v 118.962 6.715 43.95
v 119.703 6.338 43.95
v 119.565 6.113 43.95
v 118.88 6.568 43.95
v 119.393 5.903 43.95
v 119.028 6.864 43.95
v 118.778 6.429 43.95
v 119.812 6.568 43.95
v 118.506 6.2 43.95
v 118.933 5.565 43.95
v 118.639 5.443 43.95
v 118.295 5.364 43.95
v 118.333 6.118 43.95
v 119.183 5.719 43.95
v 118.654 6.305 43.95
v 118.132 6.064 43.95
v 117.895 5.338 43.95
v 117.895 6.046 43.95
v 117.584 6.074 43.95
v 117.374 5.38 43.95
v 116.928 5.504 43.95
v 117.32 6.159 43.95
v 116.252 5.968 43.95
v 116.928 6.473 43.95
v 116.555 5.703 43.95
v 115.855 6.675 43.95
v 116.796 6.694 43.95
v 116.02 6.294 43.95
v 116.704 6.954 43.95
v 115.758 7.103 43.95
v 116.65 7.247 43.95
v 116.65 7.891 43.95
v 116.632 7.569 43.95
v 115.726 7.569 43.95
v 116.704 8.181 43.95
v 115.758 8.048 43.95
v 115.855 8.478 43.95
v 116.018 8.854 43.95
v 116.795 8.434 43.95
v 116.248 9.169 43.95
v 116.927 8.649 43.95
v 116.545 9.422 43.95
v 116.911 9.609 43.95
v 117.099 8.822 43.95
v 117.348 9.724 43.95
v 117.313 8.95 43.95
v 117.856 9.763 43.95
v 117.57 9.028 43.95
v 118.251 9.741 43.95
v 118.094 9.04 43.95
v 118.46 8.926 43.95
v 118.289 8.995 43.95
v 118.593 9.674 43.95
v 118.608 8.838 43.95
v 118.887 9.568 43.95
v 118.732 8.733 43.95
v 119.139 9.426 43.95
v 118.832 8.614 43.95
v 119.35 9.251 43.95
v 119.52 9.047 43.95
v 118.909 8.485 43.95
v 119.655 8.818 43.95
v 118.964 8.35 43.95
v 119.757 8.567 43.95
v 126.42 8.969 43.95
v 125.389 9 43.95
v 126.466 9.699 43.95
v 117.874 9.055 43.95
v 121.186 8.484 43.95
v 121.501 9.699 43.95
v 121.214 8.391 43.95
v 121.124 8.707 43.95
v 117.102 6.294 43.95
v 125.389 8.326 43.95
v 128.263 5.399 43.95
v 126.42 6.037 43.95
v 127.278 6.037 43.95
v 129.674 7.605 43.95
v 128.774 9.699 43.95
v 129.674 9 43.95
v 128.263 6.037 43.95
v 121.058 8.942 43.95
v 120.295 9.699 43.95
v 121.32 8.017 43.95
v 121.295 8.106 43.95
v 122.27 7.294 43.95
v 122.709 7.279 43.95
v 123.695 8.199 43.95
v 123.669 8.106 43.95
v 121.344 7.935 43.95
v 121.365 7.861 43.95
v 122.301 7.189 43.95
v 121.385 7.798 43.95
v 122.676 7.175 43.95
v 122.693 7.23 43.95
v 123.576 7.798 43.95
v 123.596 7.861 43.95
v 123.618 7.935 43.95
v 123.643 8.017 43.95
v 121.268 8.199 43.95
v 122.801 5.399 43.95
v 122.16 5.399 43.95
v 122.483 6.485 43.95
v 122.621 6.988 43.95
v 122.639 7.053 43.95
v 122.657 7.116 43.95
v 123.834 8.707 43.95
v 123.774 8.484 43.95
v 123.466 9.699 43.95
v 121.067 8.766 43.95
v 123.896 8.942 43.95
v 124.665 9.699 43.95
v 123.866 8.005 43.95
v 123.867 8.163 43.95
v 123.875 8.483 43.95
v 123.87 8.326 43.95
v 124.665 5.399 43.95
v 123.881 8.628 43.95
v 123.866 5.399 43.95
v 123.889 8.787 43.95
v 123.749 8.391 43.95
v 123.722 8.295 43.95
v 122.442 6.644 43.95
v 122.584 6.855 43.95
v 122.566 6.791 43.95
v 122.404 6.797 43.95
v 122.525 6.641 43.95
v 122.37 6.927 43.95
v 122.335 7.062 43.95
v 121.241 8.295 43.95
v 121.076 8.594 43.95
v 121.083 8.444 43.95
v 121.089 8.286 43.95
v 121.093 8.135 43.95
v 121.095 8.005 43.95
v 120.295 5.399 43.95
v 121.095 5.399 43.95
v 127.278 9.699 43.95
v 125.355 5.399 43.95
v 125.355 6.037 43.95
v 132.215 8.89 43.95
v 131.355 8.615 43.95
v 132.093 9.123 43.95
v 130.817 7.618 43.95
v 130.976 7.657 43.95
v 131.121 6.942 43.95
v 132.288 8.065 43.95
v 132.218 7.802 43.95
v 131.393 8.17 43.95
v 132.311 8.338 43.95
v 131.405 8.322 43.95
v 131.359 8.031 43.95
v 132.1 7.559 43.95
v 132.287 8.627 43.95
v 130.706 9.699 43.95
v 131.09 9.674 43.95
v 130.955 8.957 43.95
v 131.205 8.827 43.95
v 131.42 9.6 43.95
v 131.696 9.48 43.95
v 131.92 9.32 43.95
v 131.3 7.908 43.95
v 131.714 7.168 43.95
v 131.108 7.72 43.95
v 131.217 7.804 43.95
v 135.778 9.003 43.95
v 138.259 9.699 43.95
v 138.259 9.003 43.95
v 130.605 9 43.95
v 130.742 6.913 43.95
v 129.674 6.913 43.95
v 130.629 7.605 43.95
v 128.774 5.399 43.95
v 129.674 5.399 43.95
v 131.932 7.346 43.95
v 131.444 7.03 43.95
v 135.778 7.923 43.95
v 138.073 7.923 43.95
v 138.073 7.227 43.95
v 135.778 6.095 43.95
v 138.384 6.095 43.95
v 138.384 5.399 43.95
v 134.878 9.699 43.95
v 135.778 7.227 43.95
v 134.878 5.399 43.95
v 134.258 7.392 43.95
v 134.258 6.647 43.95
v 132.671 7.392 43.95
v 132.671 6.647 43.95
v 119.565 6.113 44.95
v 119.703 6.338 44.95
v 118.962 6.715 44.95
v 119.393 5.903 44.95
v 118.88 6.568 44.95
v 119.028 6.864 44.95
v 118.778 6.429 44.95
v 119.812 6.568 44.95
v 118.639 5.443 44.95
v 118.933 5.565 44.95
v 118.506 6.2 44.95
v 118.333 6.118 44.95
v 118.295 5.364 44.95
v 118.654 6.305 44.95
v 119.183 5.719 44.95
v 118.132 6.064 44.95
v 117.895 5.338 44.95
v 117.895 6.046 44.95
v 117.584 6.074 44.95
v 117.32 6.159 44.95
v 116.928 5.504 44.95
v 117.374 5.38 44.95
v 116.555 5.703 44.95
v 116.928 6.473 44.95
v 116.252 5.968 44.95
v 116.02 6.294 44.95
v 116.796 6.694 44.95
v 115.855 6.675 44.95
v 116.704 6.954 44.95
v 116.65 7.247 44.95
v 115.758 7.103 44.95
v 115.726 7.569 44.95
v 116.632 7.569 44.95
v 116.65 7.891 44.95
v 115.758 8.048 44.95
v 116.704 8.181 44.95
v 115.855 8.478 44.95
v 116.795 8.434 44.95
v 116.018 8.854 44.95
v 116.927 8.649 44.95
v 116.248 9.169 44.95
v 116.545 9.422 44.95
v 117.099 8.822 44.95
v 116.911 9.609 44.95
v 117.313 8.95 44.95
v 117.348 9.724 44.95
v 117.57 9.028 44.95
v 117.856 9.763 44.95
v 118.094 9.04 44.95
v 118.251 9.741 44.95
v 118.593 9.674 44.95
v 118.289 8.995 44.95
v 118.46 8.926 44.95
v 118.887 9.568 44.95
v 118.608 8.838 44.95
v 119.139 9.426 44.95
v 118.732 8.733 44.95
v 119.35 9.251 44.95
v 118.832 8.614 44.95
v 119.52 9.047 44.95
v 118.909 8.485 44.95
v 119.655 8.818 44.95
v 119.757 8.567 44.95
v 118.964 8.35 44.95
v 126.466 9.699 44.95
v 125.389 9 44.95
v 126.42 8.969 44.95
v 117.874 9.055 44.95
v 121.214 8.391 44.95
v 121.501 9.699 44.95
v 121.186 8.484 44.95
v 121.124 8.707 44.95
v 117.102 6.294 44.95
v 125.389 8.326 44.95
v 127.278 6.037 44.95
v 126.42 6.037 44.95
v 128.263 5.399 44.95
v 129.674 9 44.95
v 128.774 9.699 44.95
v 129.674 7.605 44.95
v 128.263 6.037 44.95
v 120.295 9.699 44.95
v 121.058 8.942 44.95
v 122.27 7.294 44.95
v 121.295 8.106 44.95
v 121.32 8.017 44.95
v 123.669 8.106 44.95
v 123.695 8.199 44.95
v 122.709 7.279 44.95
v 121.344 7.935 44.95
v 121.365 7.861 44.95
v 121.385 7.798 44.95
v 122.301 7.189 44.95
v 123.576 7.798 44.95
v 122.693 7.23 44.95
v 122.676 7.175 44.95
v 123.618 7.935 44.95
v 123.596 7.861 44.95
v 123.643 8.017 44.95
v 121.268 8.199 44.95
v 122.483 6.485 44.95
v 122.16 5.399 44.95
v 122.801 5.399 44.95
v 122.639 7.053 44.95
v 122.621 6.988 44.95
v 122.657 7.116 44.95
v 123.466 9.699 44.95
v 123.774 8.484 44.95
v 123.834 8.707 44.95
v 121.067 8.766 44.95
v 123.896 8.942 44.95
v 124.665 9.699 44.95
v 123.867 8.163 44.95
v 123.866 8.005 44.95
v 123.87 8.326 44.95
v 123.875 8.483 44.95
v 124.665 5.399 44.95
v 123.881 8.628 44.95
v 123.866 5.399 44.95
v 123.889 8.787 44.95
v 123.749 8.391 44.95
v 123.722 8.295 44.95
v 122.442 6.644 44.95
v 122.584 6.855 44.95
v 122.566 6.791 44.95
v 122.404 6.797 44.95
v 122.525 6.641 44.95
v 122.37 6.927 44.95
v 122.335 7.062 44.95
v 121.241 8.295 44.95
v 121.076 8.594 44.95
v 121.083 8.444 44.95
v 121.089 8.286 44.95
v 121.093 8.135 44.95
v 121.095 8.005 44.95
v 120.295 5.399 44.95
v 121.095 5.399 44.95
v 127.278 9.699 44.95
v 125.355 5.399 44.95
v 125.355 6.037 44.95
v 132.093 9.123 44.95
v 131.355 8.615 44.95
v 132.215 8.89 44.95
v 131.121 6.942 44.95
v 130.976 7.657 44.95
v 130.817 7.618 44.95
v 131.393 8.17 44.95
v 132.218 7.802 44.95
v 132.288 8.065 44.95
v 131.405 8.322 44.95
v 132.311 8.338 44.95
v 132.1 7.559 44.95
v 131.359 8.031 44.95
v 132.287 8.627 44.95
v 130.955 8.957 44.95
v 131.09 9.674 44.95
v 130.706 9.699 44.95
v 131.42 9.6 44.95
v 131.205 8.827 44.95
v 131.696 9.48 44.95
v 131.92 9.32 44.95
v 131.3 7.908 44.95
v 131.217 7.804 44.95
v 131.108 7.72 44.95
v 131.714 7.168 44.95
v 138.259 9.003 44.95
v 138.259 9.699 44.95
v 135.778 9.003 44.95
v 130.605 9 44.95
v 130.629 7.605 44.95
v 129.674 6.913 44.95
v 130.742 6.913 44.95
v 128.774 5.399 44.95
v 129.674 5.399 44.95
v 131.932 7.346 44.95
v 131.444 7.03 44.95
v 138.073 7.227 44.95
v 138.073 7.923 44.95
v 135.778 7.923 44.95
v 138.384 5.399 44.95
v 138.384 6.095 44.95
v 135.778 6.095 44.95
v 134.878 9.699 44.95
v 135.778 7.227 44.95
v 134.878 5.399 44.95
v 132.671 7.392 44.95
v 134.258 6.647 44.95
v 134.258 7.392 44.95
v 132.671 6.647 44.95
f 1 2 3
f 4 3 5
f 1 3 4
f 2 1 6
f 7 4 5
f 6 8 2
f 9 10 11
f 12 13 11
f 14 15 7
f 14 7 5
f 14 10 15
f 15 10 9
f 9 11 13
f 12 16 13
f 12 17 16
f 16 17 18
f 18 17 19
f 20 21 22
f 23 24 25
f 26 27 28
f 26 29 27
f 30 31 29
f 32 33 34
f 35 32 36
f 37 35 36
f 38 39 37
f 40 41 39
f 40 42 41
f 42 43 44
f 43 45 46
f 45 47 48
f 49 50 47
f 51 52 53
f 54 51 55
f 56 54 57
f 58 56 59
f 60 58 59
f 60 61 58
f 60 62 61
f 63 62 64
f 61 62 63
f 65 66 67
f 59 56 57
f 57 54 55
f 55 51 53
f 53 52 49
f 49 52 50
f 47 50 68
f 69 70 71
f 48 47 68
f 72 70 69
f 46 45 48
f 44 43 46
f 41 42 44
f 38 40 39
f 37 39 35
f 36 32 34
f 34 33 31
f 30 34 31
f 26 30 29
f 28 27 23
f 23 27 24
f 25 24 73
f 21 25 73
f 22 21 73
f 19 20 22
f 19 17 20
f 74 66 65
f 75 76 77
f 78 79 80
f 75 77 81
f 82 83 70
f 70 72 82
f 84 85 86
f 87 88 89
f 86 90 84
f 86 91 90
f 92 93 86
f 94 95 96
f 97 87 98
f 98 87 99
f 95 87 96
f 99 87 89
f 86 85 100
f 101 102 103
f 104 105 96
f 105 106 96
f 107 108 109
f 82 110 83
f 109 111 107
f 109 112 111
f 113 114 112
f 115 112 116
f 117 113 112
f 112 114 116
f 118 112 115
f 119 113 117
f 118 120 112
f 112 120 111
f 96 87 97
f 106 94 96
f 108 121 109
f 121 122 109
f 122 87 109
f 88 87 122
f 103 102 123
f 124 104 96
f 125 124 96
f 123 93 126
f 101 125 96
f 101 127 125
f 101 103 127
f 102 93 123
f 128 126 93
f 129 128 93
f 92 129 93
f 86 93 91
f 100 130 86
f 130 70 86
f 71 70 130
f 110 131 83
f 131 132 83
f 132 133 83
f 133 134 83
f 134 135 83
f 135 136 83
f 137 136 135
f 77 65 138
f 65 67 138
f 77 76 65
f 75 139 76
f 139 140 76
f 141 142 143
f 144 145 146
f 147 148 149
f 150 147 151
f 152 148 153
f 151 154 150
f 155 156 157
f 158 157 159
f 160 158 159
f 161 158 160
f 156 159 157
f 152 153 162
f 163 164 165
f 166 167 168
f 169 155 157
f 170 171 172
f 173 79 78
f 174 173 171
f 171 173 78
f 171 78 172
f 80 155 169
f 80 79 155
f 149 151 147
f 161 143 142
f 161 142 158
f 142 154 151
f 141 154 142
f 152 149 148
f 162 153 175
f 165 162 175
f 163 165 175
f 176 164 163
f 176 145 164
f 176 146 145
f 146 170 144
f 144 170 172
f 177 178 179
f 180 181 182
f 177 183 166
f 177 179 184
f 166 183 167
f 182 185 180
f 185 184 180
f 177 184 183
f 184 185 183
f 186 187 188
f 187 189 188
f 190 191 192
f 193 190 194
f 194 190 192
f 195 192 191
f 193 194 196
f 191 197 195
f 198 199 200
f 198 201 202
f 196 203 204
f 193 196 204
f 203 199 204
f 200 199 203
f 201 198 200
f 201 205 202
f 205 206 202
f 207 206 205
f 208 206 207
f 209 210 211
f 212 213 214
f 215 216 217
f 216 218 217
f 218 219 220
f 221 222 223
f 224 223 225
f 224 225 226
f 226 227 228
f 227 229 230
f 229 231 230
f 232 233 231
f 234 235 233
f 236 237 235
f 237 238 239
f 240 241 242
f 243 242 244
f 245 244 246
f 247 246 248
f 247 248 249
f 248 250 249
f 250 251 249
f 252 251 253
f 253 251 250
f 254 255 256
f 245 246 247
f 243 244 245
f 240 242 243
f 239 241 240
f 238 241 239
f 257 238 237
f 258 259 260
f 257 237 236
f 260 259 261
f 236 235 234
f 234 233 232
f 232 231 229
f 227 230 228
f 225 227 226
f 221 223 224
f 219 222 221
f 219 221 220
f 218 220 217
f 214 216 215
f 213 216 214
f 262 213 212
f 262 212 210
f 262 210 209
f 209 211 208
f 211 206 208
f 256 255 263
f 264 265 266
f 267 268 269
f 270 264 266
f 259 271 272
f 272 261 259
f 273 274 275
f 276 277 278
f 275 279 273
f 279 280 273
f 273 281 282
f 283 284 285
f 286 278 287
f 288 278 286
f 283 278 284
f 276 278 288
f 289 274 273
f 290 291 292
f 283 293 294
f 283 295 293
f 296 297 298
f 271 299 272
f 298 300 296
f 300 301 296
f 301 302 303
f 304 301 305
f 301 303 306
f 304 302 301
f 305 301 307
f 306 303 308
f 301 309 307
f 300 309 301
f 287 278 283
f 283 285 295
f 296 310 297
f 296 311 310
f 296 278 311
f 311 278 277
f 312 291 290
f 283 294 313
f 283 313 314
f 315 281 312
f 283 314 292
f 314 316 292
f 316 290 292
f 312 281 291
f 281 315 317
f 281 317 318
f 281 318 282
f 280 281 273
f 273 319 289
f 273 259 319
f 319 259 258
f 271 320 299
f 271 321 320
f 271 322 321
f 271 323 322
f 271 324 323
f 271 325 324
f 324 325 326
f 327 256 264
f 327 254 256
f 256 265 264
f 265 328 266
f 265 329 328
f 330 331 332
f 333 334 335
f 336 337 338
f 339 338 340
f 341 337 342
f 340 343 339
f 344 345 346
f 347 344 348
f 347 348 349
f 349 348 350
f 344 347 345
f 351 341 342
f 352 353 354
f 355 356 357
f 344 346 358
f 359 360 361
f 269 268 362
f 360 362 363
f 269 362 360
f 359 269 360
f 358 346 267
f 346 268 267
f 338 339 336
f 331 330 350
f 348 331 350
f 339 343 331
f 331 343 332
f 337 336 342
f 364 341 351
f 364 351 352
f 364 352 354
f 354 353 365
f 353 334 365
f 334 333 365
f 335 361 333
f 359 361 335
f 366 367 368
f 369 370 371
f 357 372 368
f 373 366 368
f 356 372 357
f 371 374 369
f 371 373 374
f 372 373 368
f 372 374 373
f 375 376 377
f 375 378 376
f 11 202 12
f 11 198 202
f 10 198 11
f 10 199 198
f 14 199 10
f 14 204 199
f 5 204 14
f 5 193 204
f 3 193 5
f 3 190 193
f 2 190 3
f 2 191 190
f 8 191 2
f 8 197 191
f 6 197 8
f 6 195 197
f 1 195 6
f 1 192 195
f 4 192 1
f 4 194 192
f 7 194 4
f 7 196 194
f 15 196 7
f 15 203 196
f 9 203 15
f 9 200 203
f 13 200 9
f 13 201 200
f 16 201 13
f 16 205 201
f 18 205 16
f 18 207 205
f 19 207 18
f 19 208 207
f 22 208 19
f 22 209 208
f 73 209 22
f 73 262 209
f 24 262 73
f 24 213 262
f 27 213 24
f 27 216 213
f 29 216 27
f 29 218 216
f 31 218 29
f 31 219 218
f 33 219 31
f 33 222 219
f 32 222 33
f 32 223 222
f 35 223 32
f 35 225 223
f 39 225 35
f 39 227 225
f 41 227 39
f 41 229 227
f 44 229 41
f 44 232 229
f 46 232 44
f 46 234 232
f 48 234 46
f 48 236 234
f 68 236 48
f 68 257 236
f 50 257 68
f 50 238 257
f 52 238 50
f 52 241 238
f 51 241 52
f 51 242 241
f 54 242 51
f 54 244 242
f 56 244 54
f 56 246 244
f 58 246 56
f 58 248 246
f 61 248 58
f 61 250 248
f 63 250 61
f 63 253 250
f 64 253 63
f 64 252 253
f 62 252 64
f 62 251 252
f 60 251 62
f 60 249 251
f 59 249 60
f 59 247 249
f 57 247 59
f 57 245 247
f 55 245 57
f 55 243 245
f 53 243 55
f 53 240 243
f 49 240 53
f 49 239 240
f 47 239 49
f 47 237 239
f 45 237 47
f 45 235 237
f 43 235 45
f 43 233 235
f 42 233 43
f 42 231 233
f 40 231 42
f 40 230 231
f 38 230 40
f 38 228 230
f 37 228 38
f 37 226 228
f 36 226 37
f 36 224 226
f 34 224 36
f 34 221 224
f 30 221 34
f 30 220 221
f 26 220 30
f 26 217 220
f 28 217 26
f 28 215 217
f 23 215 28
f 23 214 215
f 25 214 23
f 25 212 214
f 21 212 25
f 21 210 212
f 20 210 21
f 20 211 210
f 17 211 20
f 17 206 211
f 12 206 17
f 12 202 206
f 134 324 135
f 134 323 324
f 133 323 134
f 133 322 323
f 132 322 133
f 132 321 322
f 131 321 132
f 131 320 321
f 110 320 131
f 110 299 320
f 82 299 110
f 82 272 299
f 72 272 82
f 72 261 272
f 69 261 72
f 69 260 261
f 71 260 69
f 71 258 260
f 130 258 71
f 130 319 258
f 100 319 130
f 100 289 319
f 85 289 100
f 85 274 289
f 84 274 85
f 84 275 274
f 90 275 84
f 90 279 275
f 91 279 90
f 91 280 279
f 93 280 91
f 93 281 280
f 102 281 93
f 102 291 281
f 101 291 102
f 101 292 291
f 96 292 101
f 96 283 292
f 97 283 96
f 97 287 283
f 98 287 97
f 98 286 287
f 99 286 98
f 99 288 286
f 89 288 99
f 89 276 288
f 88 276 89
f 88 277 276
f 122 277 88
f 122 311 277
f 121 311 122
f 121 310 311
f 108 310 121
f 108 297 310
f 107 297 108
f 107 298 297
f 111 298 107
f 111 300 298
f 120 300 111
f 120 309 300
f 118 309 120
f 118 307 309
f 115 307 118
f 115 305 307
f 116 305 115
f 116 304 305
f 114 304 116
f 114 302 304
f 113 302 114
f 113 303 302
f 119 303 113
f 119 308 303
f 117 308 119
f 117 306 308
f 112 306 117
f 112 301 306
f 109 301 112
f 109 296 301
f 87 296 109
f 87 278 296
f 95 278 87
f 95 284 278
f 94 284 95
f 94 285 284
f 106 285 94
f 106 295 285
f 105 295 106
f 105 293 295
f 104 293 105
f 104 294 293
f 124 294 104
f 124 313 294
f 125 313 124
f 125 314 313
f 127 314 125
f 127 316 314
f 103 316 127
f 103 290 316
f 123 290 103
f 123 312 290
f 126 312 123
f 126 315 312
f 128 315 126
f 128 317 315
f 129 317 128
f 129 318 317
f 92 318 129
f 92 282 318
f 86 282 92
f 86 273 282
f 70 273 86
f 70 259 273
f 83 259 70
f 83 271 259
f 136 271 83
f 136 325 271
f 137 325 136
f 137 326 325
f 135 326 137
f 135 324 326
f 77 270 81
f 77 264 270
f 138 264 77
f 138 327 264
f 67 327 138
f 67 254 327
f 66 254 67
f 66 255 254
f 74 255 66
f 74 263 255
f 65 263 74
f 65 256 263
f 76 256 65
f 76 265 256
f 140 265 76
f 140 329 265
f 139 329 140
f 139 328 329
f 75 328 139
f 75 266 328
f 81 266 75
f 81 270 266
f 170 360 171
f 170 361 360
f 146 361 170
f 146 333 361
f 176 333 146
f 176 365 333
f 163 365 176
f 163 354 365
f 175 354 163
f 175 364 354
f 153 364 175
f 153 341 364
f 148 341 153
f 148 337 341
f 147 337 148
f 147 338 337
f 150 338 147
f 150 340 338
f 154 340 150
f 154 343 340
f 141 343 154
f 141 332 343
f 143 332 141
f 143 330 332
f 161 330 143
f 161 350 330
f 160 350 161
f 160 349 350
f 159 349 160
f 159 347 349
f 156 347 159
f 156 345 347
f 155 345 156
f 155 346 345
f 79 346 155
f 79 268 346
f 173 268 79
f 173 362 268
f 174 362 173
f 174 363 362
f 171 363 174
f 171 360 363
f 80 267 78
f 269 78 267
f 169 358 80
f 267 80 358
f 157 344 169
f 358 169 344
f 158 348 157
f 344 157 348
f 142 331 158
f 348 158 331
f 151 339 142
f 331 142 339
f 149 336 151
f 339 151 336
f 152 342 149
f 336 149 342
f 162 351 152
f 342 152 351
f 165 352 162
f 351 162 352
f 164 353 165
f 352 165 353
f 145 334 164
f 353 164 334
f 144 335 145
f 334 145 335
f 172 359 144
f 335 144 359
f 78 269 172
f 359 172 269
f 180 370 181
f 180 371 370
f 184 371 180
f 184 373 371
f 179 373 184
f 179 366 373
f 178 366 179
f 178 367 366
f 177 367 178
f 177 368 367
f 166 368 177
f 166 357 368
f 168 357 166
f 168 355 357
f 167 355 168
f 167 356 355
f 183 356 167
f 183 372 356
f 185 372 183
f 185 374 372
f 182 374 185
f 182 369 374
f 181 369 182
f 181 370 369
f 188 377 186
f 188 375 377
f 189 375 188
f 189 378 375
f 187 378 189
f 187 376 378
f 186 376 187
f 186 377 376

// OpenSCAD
// CM1P-E ID text, engraved 0.5 into the plate's top face (frame as cm1p_e_freecad.py).
translate([127, 7.5, 43.95]) linear_extrude(1) text("CM1P-E", size = 4.5, font = "Liberation Sans:style=Bold", halign = "center", valign = "center");
